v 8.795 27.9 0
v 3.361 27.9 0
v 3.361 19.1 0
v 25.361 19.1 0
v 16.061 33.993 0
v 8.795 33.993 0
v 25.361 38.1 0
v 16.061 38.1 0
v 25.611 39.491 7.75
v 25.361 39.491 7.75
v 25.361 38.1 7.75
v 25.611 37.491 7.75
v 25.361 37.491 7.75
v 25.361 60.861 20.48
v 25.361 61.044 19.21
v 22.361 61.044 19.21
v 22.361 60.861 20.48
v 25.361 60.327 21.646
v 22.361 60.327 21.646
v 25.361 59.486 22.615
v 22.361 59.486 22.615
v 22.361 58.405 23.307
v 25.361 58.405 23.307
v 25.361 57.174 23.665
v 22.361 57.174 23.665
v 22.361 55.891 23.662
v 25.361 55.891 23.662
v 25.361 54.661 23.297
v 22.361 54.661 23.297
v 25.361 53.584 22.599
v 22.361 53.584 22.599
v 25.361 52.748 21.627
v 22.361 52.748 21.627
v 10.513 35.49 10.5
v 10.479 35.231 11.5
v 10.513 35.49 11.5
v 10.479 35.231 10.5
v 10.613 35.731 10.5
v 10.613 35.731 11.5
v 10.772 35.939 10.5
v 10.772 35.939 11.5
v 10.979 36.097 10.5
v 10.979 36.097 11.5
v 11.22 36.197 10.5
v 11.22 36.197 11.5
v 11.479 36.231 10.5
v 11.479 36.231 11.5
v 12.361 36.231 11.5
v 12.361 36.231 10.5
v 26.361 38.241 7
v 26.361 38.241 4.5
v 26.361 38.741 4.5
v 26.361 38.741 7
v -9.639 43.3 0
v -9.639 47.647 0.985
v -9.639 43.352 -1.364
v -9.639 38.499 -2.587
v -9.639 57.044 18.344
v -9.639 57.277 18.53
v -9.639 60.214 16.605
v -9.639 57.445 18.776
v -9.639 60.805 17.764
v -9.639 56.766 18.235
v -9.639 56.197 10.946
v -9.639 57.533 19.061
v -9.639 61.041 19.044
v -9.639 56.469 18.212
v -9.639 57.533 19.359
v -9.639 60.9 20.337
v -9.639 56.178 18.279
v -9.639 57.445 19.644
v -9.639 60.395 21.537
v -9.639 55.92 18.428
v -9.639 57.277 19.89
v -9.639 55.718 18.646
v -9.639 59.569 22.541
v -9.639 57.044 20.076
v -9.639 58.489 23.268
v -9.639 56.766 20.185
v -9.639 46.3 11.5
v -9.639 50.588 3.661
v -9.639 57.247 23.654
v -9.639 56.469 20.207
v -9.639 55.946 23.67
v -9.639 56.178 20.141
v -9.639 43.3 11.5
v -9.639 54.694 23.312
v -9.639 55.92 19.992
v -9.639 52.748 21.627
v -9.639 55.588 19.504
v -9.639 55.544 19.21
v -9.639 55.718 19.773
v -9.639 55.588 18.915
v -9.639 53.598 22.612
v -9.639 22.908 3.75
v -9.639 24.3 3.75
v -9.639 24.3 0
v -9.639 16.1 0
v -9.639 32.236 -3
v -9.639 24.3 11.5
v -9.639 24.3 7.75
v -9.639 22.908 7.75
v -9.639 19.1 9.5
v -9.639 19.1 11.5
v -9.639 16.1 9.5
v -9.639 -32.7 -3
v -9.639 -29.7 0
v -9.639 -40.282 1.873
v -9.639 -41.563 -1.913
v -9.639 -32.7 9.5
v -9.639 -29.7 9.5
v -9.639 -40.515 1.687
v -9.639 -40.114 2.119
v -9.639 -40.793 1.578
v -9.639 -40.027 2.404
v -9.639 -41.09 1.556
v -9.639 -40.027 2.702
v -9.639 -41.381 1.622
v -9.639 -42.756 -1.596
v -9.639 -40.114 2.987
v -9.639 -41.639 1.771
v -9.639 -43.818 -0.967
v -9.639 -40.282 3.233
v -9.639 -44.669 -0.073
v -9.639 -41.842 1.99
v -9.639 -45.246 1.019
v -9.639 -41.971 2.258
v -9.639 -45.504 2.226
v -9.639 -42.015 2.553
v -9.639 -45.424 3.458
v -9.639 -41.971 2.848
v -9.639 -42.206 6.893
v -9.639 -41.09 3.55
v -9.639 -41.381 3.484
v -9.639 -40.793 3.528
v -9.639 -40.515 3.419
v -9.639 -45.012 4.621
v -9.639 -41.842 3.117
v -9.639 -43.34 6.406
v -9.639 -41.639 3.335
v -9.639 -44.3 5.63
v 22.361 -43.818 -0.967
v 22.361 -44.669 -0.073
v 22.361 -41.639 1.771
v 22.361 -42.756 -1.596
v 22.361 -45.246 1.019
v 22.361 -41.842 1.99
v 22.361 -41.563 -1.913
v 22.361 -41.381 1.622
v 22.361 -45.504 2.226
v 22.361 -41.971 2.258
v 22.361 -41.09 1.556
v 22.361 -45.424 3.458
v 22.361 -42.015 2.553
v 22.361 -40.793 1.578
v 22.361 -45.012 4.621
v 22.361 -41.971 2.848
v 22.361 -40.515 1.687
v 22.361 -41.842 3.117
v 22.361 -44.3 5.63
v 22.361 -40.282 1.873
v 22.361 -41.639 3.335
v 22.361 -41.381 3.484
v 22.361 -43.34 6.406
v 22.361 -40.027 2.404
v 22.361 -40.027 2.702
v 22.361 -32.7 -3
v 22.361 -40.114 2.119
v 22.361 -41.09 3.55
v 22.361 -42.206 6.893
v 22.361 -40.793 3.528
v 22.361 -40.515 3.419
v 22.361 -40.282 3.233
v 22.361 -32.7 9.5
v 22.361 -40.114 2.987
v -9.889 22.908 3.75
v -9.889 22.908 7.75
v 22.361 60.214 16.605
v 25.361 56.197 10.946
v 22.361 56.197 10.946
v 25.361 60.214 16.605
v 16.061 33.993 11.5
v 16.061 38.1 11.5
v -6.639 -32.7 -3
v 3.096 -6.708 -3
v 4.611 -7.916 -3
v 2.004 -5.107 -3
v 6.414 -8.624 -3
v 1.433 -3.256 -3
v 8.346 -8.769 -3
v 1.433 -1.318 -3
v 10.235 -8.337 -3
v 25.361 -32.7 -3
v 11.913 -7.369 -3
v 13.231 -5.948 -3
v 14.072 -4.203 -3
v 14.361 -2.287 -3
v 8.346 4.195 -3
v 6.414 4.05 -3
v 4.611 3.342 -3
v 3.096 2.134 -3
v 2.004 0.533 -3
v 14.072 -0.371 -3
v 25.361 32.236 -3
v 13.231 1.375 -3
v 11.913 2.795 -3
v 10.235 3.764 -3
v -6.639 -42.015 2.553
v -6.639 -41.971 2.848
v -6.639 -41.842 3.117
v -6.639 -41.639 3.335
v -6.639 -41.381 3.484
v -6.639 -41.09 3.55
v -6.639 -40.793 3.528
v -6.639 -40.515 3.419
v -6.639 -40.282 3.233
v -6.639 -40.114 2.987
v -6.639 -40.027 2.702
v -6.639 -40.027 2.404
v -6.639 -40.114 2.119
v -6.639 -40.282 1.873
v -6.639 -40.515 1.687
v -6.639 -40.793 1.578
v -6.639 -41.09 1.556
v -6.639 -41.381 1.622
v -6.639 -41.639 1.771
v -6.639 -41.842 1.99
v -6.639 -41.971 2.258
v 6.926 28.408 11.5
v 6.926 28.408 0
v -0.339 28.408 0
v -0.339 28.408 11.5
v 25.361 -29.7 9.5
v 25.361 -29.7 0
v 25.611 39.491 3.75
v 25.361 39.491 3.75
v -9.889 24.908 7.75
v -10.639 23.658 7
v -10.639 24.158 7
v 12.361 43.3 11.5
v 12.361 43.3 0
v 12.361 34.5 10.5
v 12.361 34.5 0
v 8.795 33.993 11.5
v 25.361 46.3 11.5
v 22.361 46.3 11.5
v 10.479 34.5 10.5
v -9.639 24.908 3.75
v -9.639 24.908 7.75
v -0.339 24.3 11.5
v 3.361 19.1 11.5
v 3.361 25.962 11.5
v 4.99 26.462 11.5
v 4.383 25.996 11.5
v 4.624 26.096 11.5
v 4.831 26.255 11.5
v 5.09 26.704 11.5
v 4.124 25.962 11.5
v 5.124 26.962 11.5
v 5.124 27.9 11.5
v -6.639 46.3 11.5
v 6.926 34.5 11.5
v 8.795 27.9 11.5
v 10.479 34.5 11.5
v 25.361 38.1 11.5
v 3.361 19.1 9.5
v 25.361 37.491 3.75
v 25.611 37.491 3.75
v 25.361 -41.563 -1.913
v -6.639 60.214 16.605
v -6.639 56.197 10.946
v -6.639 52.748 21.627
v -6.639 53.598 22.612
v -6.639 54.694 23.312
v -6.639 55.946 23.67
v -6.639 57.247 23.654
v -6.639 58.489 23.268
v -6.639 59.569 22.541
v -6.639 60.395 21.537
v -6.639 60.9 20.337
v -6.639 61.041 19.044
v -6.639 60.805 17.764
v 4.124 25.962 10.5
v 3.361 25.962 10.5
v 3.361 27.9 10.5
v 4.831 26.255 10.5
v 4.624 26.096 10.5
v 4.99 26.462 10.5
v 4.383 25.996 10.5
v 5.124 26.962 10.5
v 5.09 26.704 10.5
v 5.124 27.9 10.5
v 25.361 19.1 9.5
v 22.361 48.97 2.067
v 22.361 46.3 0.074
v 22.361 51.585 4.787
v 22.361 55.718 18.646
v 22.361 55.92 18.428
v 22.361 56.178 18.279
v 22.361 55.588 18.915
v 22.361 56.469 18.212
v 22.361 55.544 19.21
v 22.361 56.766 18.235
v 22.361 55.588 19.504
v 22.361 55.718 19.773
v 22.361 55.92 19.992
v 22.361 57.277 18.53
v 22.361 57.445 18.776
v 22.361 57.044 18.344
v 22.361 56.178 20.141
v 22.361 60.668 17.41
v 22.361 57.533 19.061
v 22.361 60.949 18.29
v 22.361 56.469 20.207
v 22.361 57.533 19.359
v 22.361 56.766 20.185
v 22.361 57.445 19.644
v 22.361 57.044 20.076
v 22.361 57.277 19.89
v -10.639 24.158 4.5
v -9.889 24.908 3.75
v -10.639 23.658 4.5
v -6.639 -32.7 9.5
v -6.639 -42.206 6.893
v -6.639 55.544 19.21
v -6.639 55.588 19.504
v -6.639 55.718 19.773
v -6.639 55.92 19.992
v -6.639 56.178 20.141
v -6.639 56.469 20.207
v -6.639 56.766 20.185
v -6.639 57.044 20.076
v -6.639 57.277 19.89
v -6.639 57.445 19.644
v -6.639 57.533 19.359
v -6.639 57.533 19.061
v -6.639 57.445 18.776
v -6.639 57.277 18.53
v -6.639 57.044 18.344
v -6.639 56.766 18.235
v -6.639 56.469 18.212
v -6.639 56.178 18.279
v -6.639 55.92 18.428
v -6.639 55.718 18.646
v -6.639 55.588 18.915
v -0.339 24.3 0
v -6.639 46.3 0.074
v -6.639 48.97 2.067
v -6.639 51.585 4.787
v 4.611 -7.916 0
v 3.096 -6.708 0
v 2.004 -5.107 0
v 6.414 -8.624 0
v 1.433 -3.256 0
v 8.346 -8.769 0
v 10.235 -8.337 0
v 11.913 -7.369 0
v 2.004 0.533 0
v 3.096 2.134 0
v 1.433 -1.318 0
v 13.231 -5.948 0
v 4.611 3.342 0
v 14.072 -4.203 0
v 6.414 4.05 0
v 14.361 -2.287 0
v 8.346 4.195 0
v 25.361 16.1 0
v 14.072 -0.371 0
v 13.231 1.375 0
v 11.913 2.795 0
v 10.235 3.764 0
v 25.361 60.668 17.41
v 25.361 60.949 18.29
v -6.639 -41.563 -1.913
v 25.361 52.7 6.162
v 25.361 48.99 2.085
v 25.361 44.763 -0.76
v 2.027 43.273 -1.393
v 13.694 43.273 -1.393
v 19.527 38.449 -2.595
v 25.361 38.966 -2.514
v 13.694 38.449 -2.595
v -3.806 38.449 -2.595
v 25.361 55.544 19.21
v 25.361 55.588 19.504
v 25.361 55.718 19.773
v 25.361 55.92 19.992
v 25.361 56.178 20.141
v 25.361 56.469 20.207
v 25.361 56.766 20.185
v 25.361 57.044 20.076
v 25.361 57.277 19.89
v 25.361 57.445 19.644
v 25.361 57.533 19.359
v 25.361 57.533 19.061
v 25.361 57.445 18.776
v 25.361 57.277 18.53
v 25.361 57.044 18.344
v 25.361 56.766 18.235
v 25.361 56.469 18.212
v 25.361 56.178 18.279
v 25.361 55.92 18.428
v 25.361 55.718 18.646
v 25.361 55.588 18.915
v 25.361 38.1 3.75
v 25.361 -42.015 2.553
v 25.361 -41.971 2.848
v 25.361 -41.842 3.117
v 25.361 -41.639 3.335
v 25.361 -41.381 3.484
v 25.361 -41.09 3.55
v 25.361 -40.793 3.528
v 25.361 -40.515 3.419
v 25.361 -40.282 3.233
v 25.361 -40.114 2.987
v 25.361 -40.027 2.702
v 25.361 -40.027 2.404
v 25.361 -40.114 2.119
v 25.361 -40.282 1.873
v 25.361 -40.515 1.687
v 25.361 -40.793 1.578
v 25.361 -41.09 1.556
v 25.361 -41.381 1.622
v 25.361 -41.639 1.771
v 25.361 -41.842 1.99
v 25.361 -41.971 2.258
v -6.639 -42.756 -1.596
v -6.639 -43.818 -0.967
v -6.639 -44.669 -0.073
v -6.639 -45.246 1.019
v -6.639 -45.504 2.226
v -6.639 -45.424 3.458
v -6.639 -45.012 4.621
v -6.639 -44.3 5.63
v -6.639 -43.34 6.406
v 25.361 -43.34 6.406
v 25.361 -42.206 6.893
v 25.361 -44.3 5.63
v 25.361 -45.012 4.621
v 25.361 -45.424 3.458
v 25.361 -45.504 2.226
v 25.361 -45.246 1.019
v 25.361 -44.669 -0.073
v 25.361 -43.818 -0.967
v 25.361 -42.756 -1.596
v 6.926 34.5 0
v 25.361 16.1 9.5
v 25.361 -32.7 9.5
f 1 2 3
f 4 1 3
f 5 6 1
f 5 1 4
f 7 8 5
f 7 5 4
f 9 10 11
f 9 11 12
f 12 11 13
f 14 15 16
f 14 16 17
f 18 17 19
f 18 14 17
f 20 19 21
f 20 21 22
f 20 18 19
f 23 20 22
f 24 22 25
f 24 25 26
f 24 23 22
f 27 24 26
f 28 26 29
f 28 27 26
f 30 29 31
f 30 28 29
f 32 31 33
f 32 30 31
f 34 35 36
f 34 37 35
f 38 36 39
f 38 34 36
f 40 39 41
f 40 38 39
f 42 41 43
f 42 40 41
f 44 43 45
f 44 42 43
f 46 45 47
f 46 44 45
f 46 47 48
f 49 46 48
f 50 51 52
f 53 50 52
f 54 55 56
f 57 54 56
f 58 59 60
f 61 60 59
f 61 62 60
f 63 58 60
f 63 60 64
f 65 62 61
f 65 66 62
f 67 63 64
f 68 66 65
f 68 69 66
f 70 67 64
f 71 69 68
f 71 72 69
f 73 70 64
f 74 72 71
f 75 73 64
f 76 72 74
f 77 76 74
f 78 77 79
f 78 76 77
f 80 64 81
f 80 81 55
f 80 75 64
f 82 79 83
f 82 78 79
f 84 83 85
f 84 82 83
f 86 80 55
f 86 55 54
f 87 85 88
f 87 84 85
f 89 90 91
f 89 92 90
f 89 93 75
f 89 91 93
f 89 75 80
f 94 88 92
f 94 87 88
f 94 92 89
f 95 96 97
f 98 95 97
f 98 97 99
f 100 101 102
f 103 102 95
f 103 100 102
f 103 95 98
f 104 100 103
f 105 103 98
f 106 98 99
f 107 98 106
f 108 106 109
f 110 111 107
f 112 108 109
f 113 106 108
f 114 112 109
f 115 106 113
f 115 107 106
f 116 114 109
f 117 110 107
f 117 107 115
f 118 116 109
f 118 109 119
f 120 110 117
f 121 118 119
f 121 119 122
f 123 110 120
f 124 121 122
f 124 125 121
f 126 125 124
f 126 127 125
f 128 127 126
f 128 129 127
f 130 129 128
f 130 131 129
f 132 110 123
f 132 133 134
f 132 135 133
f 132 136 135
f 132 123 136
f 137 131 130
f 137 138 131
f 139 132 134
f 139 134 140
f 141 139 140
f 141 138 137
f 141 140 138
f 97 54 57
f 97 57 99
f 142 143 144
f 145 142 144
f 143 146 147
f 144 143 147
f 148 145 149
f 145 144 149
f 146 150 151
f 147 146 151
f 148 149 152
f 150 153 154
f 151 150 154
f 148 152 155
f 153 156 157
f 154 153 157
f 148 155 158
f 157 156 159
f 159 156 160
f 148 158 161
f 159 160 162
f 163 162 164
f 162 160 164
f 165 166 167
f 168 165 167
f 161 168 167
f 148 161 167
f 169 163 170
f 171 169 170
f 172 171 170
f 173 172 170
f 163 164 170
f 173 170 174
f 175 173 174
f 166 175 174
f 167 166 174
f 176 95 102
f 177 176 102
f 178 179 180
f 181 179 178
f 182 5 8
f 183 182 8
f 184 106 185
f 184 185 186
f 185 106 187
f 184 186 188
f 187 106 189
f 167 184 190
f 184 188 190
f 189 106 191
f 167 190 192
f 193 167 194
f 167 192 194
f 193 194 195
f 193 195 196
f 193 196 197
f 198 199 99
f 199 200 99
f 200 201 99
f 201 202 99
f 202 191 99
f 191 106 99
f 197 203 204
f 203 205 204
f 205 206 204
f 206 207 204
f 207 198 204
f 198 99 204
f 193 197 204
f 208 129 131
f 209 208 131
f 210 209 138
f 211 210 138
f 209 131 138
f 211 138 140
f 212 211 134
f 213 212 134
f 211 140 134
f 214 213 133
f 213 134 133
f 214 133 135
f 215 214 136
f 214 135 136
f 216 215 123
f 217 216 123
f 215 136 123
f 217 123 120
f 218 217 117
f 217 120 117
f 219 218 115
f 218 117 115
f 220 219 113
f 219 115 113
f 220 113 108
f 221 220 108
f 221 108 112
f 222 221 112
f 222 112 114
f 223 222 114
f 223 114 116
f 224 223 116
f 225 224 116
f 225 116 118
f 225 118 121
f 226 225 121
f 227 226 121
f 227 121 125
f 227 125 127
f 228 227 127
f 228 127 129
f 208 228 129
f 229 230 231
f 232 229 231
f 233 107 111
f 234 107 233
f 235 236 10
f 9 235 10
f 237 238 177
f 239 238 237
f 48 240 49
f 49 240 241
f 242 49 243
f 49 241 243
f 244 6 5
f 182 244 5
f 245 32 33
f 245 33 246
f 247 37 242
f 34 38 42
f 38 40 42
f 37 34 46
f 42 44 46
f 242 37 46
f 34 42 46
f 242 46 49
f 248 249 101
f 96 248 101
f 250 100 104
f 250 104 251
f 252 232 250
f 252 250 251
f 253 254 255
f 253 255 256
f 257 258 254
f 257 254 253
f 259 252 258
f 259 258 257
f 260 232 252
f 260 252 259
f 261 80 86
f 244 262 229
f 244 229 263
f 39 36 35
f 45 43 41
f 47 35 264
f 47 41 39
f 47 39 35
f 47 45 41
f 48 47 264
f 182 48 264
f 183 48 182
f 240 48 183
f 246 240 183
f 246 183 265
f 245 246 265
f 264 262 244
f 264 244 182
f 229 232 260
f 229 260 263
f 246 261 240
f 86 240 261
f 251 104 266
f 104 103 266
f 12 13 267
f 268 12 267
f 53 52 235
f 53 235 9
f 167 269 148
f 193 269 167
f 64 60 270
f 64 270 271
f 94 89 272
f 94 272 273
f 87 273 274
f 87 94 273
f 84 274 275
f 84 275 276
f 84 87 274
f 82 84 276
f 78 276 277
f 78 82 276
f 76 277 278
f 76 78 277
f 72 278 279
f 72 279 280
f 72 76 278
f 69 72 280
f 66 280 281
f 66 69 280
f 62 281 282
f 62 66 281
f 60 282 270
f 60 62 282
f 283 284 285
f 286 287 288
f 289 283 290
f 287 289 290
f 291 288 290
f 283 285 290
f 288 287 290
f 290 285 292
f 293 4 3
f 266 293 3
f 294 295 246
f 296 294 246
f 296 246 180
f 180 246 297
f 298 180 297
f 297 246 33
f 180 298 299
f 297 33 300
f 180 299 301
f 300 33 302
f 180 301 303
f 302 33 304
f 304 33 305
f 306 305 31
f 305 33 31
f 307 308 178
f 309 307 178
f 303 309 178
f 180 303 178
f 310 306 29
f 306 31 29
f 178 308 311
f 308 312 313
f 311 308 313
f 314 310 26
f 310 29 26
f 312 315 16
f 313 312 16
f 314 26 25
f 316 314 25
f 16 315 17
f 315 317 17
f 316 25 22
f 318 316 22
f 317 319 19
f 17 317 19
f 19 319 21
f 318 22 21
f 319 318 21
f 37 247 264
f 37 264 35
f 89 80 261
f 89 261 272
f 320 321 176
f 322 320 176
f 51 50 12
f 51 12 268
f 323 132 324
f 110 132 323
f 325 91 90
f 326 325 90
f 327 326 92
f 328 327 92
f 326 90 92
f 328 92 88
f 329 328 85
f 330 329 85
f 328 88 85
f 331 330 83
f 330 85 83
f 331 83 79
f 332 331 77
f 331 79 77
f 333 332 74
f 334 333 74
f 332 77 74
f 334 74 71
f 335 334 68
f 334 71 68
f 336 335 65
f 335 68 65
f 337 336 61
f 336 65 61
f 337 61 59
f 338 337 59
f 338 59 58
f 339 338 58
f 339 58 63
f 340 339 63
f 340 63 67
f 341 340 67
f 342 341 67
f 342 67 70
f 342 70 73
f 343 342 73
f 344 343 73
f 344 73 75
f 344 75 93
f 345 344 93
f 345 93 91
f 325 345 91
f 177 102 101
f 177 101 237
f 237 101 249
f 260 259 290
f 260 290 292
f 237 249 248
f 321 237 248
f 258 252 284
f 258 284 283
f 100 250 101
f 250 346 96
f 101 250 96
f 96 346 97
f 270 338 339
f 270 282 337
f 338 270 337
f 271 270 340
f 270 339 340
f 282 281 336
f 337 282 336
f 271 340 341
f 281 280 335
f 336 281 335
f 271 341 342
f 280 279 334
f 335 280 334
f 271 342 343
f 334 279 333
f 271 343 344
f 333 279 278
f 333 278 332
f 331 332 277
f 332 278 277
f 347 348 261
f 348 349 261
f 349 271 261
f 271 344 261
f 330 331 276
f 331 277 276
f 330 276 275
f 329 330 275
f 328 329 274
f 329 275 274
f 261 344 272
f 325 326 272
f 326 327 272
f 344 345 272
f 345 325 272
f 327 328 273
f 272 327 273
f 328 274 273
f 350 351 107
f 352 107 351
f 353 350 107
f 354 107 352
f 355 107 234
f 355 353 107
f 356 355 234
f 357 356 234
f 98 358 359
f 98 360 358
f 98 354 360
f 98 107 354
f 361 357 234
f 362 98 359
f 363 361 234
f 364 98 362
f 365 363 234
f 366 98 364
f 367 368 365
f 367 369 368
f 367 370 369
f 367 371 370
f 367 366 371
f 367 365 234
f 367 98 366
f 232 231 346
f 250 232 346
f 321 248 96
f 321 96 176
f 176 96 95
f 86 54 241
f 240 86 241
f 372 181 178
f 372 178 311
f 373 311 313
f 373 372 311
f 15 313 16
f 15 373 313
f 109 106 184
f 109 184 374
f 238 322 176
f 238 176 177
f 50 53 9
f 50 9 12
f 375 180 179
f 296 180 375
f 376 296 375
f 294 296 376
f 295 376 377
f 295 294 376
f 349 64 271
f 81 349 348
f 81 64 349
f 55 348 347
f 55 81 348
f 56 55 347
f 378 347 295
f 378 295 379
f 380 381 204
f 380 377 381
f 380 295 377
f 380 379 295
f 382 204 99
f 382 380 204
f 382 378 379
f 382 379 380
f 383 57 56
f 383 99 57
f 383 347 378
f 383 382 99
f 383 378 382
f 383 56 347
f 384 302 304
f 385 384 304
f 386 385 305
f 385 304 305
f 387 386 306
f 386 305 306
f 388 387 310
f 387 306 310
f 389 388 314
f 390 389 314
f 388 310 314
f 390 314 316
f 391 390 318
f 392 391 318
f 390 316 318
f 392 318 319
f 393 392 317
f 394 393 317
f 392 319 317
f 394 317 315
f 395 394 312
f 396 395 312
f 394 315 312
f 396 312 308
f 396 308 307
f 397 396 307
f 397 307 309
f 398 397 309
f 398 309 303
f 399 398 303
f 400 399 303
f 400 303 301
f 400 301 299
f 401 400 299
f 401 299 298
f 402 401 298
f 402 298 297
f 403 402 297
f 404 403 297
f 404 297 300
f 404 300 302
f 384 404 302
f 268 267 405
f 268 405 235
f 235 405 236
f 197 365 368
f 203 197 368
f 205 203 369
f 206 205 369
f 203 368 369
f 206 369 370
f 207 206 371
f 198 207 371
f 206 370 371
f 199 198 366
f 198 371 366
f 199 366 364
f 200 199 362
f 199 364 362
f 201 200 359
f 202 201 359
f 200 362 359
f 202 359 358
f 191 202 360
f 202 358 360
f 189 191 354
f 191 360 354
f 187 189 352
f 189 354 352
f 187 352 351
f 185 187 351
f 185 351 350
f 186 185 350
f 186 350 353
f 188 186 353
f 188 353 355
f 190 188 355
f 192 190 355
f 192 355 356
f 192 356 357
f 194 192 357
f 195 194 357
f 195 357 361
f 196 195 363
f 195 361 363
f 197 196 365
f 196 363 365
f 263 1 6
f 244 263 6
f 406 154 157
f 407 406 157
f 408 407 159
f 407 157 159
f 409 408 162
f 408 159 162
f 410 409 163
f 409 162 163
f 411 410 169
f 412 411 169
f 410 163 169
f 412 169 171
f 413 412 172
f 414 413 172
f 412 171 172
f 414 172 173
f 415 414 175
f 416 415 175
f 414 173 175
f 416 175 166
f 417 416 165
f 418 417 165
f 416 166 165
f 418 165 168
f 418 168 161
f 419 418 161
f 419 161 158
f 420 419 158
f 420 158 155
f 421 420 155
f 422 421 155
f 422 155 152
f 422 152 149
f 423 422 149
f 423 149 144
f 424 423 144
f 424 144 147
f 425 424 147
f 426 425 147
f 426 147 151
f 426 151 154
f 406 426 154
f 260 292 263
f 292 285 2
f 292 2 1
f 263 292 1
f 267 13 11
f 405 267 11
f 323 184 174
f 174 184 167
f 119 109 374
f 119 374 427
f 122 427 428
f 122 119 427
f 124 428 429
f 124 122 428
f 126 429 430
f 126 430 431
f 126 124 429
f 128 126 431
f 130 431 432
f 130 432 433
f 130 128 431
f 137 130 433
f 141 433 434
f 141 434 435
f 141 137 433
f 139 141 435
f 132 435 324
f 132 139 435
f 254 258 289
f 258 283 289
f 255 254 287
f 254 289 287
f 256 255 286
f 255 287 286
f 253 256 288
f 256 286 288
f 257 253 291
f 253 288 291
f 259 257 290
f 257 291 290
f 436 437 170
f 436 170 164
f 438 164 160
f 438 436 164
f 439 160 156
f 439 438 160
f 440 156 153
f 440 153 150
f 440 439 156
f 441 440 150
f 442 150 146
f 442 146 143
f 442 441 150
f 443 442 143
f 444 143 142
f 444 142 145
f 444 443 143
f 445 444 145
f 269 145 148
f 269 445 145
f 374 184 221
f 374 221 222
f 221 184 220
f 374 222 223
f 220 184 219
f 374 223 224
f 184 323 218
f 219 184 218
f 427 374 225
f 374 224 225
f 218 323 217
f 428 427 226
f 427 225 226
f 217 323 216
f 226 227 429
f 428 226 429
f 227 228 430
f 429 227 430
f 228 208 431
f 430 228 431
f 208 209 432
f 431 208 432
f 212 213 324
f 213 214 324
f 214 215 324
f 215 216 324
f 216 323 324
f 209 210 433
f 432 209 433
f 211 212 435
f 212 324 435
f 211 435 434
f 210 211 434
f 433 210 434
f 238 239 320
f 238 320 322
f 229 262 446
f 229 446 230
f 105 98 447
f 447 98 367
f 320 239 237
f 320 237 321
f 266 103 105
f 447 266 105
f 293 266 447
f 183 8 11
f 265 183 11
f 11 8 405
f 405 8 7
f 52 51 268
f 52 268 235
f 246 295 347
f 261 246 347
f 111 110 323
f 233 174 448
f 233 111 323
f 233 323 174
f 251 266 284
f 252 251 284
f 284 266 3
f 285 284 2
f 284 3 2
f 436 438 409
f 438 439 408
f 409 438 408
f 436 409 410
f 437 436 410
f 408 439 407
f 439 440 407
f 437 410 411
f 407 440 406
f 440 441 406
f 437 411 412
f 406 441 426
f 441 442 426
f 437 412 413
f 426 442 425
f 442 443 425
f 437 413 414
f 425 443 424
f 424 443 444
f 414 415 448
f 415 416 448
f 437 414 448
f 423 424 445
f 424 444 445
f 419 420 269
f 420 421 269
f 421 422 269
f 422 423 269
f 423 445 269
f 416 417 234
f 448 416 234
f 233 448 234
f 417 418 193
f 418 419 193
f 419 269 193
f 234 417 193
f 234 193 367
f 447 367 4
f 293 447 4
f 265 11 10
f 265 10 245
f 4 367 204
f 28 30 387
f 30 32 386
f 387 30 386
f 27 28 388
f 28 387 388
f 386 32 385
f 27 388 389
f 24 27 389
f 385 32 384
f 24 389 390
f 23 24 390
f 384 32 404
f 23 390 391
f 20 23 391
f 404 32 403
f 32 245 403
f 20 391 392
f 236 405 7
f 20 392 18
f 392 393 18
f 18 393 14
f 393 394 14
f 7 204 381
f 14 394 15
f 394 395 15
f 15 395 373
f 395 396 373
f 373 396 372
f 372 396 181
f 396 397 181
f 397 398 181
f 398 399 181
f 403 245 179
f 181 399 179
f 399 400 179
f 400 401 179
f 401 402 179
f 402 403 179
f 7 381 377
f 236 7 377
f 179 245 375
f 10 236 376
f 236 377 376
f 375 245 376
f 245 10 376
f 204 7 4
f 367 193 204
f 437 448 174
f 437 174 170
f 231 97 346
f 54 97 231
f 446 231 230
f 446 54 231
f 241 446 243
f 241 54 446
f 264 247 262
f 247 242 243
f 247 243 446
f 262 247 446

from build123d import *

# Parameters (mm, degrees)
F0_R      = 6.5
F0_W      = 34.999999702
F0_H      = 3
F0_H_2    = 0.3
F1_DEPTH  = 3
F2_DEPTH  = 9.5
F3_DEPTH  = 11.5
F5_DEPTH  = 3
F7_DEPTH  = 3
F8_R      = 1
F9_DEPTH  = 35.000999702
F11_DEPTH = 1
F13_DEPTH = 1
F14_SIZE  = 0.75
F15_W     = 1.8819853365
F15_H     = 1.731043148
F15_W_2   = 1.7636035271
F15_H_2   = 1.938064149
F16_DEPTH = 1
F18_DEPTH = 36.000999702
F19_R     = 1


# Not quite as in the source:
# - ends of sketch curves that miss each other by under 0.0002 mm in the source are joined
# - a feature names something its author has since deleted; it is built from what else it names


with BuildPart() as f1:
    # F0 (on Top) → F1 (new body)
    with BuildSketch(Plane.XY):
        Polygon((7.8607099131, 16.1003852367), (-9.6392899379, 16.1003852367), (-9.6392899379, -29.3996147633), (25.3607097641, -29.3996147633), (25.3607097641, 16.1003852367), align=None)
        with Locations((7.8607099131, -2.2867515218)):
            Circle(F0_R, mode=Mode.SUBTRACT)
        with Locations((7.8607099131, -31.1996147633)):
            Rectangle(F0_W, F0_H)
        Polygon((-9.6392899379, 19.1003852367), (-9.6392899379, 16.1003852367), (7.8607099131, 16.1003852367), (25.3607097641, 16.1003852367), (25.3607097641, 19.1003852367), (22.192974557, 19.1003852367), (3.3607097641, 19.1003852367), align=None)
        Polygon((-9.6392899379, 46.3003852367), (-9.6392899379, 43.3003852367), (-6.4715547308, 43.3003852367), (12.3607100621, 43.3003852367), (25.3607097641, 43.3003852367), (25.3607097641, 46.3003852367), align=None)
        with Locations((7.8607099131, -29.5496147633)):
            Rectangle(F0_W, F0_H_2)
        Polygon((16.0607097641, 38.1003852367), (25.3607097641, 38.1003852367), (25.3607097641, 43.3003852367), (12.3607100621, 43.3003852367), (12.3607100621, 35.3003852367), (12.3607100621, 34.5003852367), (7.8607097641, 34.5003852367), (7.8607100621, 33.9926332235), (8.7954637781, 33.9926332235), (16.0607097641, 33.9926332235), align=None)
        Polygon((-9.6392899379, 24.3003852367), (-9.6392899379, 19.1003852367), (3.3607097641, 19.1003852367), (3.3607097641, 27.1003852367), (3.3607097641, 27.9003852367), (7.8607100621, 27.9003852367), (7.8607100621, 28.4081372499), (6.9259563461, 28.4081372499), (-0.3392899379, 28.4081372499), (-0.3392899379, 24.3003852367), align=None)
        Polygon((6.9259563461, 34.5003852367), (6.9259563461, 28.4081372499), (7.8607097641, 28.4081372499), (7.8607100621, 33.9926332235), (7.8607100621, 34.5003852367), align=None)
        Polygon((7.8607100621, 28.4081372499), (7.8607100621, 27.9003852367), (8.7954637781, 27.9003852367), (8.7954637781, 33.9926332235), (7.8607097641, 33.9926332235), align=None)
        Polygon((-9.6392899379, 43.3003852367), (-9.6392899379, 24.3003852367), (-0.3392899379, 24.3003852367), (-0.3392899379, 28.4081372499), (6.9259563461, 28.4081372499), (6.9259563461, 34.5003852367), (7.8607100621, 34.5003852367), (12.3607100621, 34.5003852367), (12.3607100621, 35.3003852367), (12.3607100621, 43.3003852367), (-6.4715547308, 43.3003852367), align=None)
        Polygon((3.3607097641, 27.1003852367), (3.3607097641, 19.1003852367), (22.192974557, 19.1003852367), (25.3607097641, 19.1003852367), (25.3607097641, 38.1003852367), (16.0607097641, 38.1003852367), (16.0607097641, 33.9926332235), (8.7954637781, 33.9926332235), (8.7954637781, 27.9003852367), (7.8607100621, 27.9003852367), (3.3607097641, 27.9003852367), align=None)
    extrude(amount=-F1_DEPTH)

    # F0 (on Top) → F2 (join)
    with BuildSketch(Plane.XY):
        with Locations((7.8607099131, -31.1996147633)):
            Rectangle(F0_W, F0_H)
        Polygon((-9.6392899379, 19.1003852367), (-9.6392899379, 16.1003852367), (7.8607099131, 16.1003852367), (25.3607097641, 16.1003852367), (25.3607097641, 19.1003852367), (22.192974557, 19.1003852367), (3.3607097641, 19.1003852367), align=None)
    extrude(amount=F2_DEPTH)

    # F0 (on Top) → F3 (join)
    with BuildSketch(Plane.XY):
        Polygon((-9.6392899379, 46.3003852367), (-9.6392899379, 43.3003852367), (-6.4715547308, 43.3003852367), (12.3607100621, 43.3003852367), (25.3607097641, 43.3003852367), (25.3607097641, 46.3003852367), align=None)
        Polygon((-9.6392899379, 24.3003852367), (-9.6392899379, 19.1003852367), (3.3607097641, 19.1003852367), (3.3607097641, 27.1003852367), (3.3607097641, 27.9003852367), (7.8607100621, 27.9003852367), (7.8607100621, 28.4081372499), (6.9259563461, 28.4081372499), (-0.3392899379, 28.4081372499), (-0.3392899379, 24.3003852367), align=None)
        Polygon((7.8607100621, 28.4081372499), (7.8607100621, 27.9003852367), (8.7954637781, 27.9003852367), (8.7954637781, 33.9926332235), (7.8607097641, 33.9926332235), align=None)
        Polygon((6.9259563461, 34.5003852367), (6.9259563461, 28.4081372499), (7.8607097641, 28.4081372499), (7.8607100621, 33.9926332235), (7.8607100621, 34.5003852367), align=None)
        Polygon((16.0607097641, 38.1003852367), (25.3607097641, 38.1003852367), (25.3607097641, 43.3003852367), (12.3607100621, 43.3003852367), (12.3607100621, 35.3003852367), (12.3607100621, 34.5003852367), (7.8607097641, 34.5003852367), (7.8607100621, 33.9926332235), (8.7954637781, 33.9926332235), (16.0607097641, 33.9926332235), align=None)
    extrude(amount=F3_DEPTH)

    # F4 (on face) → F5 (join)
    with BuildSketch(Plane.YZ.offset(25.3607097641)):
        Polygon((-32.6996147633, -3), (46.3003852367, -3), (46.3003852367, 11.5), (38.1003852367, 11.5), (38.1003852367, 0), (19.1003852367, 0), (19.1003852367, 9.5), (16.1003852367, 9.5), (16.1003852367, 0), (-29.6996147633, 0), (-29.6996147633, 9.5), (-32.6996147633, 9.5), align=None)
        with BuildLine():
            Line((46.3003852367, 11.5), (46.3003852367, -3))
            Line((46.3003852367, -3), (60.2135883006, 16.6053474951))
            ThreePointArc((60.2135883006, 16.6053474951), (54.0324103863, 15.4756413664), (52.7478740756, 21.6265082006))
            Line((52.7478740756, 21.6265082006), (46.3003852367, 11.5))
        make_face()
        with BuildLine():
            ThreePointArc((52.7478740756, 21.6265082006), (54.0324103863, 15.4756413664), (60.2135883006, 16.6053474951))
            ThreePointArc((60.2135883006, 16.6053474951), (60.8312132136, 17.8429507129), (61.0437823534, 19.2096754909))
            ThreePointArc((61.0437823534, 19.2096754909), (57.8024349564, 23.5300682537), (52.7478740756, 21.6265082006))
        make_face()
        with BuildLine():
            Line((-41.5630528886, -1.9133363436), (-32.6996147633, -3))
            Line((-32.6996147633, -3), (-32.6996147633, 9.5))
            Line((-32.6996147633, 9.5), (-42.2056278, 6.8929759665))
            ThreePointArc((-42.2056278, 6.8929759665), (-38.2865124349, 6.1313346687), (-36.5154499114, 2.5532206055))
            ThreePointArc((-36.5154499114, 2.5532206055), (-38.0333544566, -0.8168100619), (-41.5630528886, -1.9133363436))
        make_face()
        with BuildLine():
            ThreePointArc((-42.2056278, 6.8929759665), (-45.503517949, 2.2257373389), (-41.5630528886, -1.9133363436))
            ThreePointArc((-41.5630528886, -1.9133363436), (-38.0333544566, -0.8168100619), (-36.5154499114, 2.5532206055))
            ThreePointArc((-36.5154499114, 2.5532206055), (-38.2865124349, 6.1313346687), (-42.2056278, 6.8929759665))
        make_face()
    extrude(amount=-F5_DEPTH)

    # F6 (on face) → F7 (join)
    with BuildSketch(Plane(origin=(-9.6392899379, 0, 0), x_dir=(0, -1, 0), z_dir=(-1, 0, 0))):
        with BuildLine():
            Line((-60.2135883006, 16.6053474951), (-46.3003852367, -3))
            Line((-46.3003852367, -3), (-46.3003852367, 11.5))
            Line((-46.3003852367, 11.5), (-52.7478740756, 21.6265082006))
            ThreePointArc((-52.7478740756, 21.6265082006), (-59.0551543205, 22.9437096154), (-60.2135883006, 16.6053474951))
        make_face()
        Polygon((-46.3003852367, 11.5), (-46.3003852367, -3), (32.6996147633, -3), (32.6996147633, 9.5), (29.6996147633, 9.5), (29.6996147633, 0), (-16.1003852367, 0), (-16.1003852367, 9.5), (-19.1003852367, 9.5), (-19.1003852367, 11.5), (-24.3003852367, 11.5), (-24.3003852367, 0), (-43.3003852367, 0), (-43.3003852367, 11.5), align=None)
        with BuildLine():
            Line((32.6996147633, 9.5), (32.6996147633, -3))
            Line((32.6996147633, -3), (41.5630528886, -1.9133363436))
            ThreePointArc((41.5630528886, -1.9133363436), (45.503517949, 2.2257373389), (42.2056278, 6.8929759665))
            Line((42.2056278, 6.8929759665), (32.6996147633, 9.5))
        make_face()
    extrude(amount=-F7_DEPTH)

    # F8 (on face) → F9 (cut, through all)
    with BuildSketch(Plane(origin=(-9.6392899379, 0, 0), x_dir=(0, -1, 0), z_dir=(-1, 0, 0))):
        with Locations((-56.5437823534, 19.2096754909)):
            Circle(F8_R)
        with Locations((41.0154499114, 2.5532206055)):
            Circle(F8_R)
    extrude(amount=-F9_DEPTH, mode=Mode.SUBTRACT)

    # F10 (on face) → F11 (join)
    with BuildSketch(Plane.YZ.offset(25.3607097641)):
        Polygon((39.4906885922, 7.75), (38.1003852367, 7.75), (38.1003852367, 3.75), (39.4906885922, 3.75), (39.4906885922, 5.75), align=None)
        Polygon((38.1003852367, 3.75), (38.1003852367, 7.75), (37.4906885922, 7.75), (37.4906885922, 5.75), (37.4906885922, 3.75), align=None)
    extrude(amount=F11_DEPTH)

    # F12 (on face) → F13 (join)
    with BuildSketch(Plane(origin=(-9.6392899379, 0, 0), x_dir=(0, -1, 0), z_dir=(-1, 0, 0))):
        Polygon((-22.9083076119, 7.75), (-24.3003852367, 7.75), (-24.3003852367, 3.75), (-22.9083076119, 3.75), (-22.9083076119, 5.75), align=None)
        Polygon((-24.9083076119, 7.75), (-24.9083076119, 5.75), (-24.9083076119, 3.75), (-24.3003852367, 3.75), (-24.3003852367, 7.75), align=None)
    extrude(amount=F13_DEPTH)

    # F14
    f14_edges = [f1.edges().sort_by_distance(p)[0] for p in [
        (-10.63929, 24.908308, 5.75),
        (-10.63929, 22.908308, 5.75),
        (-10.63929, 23.908308, 7.75),
        (-10.63929, 23.908308, 3.75),
        (26.36071, 38.490689, 7.75),
        (26.36071, 37.490689, 5.75),
        (26.36071, 38.490689, 3.75),
        (26.36071, 39.490689, 5.75),
    ]]
    chamfer(f14_edges, length=F14_SIZE)

    # F15 (on face) → F16 (join)
    with BuildSketch(Plane.XY.offset(11.5)):
        with Locations((11.4197173938, 35.3659068108)):
            Rectangle(F15_W, F15_H)
        with Locations((4.2425115276, 26.9313531622)):
            Rectangle(F15_W_2, F15_H_2)
    extrude(amount=-F16_DEPTH)

    # F17 (on face) → F18 (cut, through all)
    with BuildSketch(Plane(origin=(-9.6392899379, 0, 0), x_dir=(0, -1, 0), z_dir=(-1, 0, 0))):
        with BuildLine():
            Line((-56.1974216606, 10.9460940352), (-46.3003852367, -3))
            Line((-46.3003852367, -3), (-32.2360508144, -3))
            add(Edge.make_bspline(
                [(-56.1974216606, 10.9460940352), (-49.7821666885, 1.9062415714), (-46.3003852367, -3), (-32.2360508144, -3)],
                knots=[0, 0, 0, 0, 27.7243725207, 27.7243725207, 27.7243725207, 27.7243725207], degree=3))
        make_face()
    extrude(amount=-F18_DEPTH, mode=Mode.SUBTRACT)

    # F19
    f19_edges = [f1.edges().sort_by_distance(p)[0] for p in [
        (5.124313, 25.962321, 11),
        (10.478725, 36.231428, 11),
    ]]
    fillet(f19_edges, radius=F19_R)


solid = f1.part
